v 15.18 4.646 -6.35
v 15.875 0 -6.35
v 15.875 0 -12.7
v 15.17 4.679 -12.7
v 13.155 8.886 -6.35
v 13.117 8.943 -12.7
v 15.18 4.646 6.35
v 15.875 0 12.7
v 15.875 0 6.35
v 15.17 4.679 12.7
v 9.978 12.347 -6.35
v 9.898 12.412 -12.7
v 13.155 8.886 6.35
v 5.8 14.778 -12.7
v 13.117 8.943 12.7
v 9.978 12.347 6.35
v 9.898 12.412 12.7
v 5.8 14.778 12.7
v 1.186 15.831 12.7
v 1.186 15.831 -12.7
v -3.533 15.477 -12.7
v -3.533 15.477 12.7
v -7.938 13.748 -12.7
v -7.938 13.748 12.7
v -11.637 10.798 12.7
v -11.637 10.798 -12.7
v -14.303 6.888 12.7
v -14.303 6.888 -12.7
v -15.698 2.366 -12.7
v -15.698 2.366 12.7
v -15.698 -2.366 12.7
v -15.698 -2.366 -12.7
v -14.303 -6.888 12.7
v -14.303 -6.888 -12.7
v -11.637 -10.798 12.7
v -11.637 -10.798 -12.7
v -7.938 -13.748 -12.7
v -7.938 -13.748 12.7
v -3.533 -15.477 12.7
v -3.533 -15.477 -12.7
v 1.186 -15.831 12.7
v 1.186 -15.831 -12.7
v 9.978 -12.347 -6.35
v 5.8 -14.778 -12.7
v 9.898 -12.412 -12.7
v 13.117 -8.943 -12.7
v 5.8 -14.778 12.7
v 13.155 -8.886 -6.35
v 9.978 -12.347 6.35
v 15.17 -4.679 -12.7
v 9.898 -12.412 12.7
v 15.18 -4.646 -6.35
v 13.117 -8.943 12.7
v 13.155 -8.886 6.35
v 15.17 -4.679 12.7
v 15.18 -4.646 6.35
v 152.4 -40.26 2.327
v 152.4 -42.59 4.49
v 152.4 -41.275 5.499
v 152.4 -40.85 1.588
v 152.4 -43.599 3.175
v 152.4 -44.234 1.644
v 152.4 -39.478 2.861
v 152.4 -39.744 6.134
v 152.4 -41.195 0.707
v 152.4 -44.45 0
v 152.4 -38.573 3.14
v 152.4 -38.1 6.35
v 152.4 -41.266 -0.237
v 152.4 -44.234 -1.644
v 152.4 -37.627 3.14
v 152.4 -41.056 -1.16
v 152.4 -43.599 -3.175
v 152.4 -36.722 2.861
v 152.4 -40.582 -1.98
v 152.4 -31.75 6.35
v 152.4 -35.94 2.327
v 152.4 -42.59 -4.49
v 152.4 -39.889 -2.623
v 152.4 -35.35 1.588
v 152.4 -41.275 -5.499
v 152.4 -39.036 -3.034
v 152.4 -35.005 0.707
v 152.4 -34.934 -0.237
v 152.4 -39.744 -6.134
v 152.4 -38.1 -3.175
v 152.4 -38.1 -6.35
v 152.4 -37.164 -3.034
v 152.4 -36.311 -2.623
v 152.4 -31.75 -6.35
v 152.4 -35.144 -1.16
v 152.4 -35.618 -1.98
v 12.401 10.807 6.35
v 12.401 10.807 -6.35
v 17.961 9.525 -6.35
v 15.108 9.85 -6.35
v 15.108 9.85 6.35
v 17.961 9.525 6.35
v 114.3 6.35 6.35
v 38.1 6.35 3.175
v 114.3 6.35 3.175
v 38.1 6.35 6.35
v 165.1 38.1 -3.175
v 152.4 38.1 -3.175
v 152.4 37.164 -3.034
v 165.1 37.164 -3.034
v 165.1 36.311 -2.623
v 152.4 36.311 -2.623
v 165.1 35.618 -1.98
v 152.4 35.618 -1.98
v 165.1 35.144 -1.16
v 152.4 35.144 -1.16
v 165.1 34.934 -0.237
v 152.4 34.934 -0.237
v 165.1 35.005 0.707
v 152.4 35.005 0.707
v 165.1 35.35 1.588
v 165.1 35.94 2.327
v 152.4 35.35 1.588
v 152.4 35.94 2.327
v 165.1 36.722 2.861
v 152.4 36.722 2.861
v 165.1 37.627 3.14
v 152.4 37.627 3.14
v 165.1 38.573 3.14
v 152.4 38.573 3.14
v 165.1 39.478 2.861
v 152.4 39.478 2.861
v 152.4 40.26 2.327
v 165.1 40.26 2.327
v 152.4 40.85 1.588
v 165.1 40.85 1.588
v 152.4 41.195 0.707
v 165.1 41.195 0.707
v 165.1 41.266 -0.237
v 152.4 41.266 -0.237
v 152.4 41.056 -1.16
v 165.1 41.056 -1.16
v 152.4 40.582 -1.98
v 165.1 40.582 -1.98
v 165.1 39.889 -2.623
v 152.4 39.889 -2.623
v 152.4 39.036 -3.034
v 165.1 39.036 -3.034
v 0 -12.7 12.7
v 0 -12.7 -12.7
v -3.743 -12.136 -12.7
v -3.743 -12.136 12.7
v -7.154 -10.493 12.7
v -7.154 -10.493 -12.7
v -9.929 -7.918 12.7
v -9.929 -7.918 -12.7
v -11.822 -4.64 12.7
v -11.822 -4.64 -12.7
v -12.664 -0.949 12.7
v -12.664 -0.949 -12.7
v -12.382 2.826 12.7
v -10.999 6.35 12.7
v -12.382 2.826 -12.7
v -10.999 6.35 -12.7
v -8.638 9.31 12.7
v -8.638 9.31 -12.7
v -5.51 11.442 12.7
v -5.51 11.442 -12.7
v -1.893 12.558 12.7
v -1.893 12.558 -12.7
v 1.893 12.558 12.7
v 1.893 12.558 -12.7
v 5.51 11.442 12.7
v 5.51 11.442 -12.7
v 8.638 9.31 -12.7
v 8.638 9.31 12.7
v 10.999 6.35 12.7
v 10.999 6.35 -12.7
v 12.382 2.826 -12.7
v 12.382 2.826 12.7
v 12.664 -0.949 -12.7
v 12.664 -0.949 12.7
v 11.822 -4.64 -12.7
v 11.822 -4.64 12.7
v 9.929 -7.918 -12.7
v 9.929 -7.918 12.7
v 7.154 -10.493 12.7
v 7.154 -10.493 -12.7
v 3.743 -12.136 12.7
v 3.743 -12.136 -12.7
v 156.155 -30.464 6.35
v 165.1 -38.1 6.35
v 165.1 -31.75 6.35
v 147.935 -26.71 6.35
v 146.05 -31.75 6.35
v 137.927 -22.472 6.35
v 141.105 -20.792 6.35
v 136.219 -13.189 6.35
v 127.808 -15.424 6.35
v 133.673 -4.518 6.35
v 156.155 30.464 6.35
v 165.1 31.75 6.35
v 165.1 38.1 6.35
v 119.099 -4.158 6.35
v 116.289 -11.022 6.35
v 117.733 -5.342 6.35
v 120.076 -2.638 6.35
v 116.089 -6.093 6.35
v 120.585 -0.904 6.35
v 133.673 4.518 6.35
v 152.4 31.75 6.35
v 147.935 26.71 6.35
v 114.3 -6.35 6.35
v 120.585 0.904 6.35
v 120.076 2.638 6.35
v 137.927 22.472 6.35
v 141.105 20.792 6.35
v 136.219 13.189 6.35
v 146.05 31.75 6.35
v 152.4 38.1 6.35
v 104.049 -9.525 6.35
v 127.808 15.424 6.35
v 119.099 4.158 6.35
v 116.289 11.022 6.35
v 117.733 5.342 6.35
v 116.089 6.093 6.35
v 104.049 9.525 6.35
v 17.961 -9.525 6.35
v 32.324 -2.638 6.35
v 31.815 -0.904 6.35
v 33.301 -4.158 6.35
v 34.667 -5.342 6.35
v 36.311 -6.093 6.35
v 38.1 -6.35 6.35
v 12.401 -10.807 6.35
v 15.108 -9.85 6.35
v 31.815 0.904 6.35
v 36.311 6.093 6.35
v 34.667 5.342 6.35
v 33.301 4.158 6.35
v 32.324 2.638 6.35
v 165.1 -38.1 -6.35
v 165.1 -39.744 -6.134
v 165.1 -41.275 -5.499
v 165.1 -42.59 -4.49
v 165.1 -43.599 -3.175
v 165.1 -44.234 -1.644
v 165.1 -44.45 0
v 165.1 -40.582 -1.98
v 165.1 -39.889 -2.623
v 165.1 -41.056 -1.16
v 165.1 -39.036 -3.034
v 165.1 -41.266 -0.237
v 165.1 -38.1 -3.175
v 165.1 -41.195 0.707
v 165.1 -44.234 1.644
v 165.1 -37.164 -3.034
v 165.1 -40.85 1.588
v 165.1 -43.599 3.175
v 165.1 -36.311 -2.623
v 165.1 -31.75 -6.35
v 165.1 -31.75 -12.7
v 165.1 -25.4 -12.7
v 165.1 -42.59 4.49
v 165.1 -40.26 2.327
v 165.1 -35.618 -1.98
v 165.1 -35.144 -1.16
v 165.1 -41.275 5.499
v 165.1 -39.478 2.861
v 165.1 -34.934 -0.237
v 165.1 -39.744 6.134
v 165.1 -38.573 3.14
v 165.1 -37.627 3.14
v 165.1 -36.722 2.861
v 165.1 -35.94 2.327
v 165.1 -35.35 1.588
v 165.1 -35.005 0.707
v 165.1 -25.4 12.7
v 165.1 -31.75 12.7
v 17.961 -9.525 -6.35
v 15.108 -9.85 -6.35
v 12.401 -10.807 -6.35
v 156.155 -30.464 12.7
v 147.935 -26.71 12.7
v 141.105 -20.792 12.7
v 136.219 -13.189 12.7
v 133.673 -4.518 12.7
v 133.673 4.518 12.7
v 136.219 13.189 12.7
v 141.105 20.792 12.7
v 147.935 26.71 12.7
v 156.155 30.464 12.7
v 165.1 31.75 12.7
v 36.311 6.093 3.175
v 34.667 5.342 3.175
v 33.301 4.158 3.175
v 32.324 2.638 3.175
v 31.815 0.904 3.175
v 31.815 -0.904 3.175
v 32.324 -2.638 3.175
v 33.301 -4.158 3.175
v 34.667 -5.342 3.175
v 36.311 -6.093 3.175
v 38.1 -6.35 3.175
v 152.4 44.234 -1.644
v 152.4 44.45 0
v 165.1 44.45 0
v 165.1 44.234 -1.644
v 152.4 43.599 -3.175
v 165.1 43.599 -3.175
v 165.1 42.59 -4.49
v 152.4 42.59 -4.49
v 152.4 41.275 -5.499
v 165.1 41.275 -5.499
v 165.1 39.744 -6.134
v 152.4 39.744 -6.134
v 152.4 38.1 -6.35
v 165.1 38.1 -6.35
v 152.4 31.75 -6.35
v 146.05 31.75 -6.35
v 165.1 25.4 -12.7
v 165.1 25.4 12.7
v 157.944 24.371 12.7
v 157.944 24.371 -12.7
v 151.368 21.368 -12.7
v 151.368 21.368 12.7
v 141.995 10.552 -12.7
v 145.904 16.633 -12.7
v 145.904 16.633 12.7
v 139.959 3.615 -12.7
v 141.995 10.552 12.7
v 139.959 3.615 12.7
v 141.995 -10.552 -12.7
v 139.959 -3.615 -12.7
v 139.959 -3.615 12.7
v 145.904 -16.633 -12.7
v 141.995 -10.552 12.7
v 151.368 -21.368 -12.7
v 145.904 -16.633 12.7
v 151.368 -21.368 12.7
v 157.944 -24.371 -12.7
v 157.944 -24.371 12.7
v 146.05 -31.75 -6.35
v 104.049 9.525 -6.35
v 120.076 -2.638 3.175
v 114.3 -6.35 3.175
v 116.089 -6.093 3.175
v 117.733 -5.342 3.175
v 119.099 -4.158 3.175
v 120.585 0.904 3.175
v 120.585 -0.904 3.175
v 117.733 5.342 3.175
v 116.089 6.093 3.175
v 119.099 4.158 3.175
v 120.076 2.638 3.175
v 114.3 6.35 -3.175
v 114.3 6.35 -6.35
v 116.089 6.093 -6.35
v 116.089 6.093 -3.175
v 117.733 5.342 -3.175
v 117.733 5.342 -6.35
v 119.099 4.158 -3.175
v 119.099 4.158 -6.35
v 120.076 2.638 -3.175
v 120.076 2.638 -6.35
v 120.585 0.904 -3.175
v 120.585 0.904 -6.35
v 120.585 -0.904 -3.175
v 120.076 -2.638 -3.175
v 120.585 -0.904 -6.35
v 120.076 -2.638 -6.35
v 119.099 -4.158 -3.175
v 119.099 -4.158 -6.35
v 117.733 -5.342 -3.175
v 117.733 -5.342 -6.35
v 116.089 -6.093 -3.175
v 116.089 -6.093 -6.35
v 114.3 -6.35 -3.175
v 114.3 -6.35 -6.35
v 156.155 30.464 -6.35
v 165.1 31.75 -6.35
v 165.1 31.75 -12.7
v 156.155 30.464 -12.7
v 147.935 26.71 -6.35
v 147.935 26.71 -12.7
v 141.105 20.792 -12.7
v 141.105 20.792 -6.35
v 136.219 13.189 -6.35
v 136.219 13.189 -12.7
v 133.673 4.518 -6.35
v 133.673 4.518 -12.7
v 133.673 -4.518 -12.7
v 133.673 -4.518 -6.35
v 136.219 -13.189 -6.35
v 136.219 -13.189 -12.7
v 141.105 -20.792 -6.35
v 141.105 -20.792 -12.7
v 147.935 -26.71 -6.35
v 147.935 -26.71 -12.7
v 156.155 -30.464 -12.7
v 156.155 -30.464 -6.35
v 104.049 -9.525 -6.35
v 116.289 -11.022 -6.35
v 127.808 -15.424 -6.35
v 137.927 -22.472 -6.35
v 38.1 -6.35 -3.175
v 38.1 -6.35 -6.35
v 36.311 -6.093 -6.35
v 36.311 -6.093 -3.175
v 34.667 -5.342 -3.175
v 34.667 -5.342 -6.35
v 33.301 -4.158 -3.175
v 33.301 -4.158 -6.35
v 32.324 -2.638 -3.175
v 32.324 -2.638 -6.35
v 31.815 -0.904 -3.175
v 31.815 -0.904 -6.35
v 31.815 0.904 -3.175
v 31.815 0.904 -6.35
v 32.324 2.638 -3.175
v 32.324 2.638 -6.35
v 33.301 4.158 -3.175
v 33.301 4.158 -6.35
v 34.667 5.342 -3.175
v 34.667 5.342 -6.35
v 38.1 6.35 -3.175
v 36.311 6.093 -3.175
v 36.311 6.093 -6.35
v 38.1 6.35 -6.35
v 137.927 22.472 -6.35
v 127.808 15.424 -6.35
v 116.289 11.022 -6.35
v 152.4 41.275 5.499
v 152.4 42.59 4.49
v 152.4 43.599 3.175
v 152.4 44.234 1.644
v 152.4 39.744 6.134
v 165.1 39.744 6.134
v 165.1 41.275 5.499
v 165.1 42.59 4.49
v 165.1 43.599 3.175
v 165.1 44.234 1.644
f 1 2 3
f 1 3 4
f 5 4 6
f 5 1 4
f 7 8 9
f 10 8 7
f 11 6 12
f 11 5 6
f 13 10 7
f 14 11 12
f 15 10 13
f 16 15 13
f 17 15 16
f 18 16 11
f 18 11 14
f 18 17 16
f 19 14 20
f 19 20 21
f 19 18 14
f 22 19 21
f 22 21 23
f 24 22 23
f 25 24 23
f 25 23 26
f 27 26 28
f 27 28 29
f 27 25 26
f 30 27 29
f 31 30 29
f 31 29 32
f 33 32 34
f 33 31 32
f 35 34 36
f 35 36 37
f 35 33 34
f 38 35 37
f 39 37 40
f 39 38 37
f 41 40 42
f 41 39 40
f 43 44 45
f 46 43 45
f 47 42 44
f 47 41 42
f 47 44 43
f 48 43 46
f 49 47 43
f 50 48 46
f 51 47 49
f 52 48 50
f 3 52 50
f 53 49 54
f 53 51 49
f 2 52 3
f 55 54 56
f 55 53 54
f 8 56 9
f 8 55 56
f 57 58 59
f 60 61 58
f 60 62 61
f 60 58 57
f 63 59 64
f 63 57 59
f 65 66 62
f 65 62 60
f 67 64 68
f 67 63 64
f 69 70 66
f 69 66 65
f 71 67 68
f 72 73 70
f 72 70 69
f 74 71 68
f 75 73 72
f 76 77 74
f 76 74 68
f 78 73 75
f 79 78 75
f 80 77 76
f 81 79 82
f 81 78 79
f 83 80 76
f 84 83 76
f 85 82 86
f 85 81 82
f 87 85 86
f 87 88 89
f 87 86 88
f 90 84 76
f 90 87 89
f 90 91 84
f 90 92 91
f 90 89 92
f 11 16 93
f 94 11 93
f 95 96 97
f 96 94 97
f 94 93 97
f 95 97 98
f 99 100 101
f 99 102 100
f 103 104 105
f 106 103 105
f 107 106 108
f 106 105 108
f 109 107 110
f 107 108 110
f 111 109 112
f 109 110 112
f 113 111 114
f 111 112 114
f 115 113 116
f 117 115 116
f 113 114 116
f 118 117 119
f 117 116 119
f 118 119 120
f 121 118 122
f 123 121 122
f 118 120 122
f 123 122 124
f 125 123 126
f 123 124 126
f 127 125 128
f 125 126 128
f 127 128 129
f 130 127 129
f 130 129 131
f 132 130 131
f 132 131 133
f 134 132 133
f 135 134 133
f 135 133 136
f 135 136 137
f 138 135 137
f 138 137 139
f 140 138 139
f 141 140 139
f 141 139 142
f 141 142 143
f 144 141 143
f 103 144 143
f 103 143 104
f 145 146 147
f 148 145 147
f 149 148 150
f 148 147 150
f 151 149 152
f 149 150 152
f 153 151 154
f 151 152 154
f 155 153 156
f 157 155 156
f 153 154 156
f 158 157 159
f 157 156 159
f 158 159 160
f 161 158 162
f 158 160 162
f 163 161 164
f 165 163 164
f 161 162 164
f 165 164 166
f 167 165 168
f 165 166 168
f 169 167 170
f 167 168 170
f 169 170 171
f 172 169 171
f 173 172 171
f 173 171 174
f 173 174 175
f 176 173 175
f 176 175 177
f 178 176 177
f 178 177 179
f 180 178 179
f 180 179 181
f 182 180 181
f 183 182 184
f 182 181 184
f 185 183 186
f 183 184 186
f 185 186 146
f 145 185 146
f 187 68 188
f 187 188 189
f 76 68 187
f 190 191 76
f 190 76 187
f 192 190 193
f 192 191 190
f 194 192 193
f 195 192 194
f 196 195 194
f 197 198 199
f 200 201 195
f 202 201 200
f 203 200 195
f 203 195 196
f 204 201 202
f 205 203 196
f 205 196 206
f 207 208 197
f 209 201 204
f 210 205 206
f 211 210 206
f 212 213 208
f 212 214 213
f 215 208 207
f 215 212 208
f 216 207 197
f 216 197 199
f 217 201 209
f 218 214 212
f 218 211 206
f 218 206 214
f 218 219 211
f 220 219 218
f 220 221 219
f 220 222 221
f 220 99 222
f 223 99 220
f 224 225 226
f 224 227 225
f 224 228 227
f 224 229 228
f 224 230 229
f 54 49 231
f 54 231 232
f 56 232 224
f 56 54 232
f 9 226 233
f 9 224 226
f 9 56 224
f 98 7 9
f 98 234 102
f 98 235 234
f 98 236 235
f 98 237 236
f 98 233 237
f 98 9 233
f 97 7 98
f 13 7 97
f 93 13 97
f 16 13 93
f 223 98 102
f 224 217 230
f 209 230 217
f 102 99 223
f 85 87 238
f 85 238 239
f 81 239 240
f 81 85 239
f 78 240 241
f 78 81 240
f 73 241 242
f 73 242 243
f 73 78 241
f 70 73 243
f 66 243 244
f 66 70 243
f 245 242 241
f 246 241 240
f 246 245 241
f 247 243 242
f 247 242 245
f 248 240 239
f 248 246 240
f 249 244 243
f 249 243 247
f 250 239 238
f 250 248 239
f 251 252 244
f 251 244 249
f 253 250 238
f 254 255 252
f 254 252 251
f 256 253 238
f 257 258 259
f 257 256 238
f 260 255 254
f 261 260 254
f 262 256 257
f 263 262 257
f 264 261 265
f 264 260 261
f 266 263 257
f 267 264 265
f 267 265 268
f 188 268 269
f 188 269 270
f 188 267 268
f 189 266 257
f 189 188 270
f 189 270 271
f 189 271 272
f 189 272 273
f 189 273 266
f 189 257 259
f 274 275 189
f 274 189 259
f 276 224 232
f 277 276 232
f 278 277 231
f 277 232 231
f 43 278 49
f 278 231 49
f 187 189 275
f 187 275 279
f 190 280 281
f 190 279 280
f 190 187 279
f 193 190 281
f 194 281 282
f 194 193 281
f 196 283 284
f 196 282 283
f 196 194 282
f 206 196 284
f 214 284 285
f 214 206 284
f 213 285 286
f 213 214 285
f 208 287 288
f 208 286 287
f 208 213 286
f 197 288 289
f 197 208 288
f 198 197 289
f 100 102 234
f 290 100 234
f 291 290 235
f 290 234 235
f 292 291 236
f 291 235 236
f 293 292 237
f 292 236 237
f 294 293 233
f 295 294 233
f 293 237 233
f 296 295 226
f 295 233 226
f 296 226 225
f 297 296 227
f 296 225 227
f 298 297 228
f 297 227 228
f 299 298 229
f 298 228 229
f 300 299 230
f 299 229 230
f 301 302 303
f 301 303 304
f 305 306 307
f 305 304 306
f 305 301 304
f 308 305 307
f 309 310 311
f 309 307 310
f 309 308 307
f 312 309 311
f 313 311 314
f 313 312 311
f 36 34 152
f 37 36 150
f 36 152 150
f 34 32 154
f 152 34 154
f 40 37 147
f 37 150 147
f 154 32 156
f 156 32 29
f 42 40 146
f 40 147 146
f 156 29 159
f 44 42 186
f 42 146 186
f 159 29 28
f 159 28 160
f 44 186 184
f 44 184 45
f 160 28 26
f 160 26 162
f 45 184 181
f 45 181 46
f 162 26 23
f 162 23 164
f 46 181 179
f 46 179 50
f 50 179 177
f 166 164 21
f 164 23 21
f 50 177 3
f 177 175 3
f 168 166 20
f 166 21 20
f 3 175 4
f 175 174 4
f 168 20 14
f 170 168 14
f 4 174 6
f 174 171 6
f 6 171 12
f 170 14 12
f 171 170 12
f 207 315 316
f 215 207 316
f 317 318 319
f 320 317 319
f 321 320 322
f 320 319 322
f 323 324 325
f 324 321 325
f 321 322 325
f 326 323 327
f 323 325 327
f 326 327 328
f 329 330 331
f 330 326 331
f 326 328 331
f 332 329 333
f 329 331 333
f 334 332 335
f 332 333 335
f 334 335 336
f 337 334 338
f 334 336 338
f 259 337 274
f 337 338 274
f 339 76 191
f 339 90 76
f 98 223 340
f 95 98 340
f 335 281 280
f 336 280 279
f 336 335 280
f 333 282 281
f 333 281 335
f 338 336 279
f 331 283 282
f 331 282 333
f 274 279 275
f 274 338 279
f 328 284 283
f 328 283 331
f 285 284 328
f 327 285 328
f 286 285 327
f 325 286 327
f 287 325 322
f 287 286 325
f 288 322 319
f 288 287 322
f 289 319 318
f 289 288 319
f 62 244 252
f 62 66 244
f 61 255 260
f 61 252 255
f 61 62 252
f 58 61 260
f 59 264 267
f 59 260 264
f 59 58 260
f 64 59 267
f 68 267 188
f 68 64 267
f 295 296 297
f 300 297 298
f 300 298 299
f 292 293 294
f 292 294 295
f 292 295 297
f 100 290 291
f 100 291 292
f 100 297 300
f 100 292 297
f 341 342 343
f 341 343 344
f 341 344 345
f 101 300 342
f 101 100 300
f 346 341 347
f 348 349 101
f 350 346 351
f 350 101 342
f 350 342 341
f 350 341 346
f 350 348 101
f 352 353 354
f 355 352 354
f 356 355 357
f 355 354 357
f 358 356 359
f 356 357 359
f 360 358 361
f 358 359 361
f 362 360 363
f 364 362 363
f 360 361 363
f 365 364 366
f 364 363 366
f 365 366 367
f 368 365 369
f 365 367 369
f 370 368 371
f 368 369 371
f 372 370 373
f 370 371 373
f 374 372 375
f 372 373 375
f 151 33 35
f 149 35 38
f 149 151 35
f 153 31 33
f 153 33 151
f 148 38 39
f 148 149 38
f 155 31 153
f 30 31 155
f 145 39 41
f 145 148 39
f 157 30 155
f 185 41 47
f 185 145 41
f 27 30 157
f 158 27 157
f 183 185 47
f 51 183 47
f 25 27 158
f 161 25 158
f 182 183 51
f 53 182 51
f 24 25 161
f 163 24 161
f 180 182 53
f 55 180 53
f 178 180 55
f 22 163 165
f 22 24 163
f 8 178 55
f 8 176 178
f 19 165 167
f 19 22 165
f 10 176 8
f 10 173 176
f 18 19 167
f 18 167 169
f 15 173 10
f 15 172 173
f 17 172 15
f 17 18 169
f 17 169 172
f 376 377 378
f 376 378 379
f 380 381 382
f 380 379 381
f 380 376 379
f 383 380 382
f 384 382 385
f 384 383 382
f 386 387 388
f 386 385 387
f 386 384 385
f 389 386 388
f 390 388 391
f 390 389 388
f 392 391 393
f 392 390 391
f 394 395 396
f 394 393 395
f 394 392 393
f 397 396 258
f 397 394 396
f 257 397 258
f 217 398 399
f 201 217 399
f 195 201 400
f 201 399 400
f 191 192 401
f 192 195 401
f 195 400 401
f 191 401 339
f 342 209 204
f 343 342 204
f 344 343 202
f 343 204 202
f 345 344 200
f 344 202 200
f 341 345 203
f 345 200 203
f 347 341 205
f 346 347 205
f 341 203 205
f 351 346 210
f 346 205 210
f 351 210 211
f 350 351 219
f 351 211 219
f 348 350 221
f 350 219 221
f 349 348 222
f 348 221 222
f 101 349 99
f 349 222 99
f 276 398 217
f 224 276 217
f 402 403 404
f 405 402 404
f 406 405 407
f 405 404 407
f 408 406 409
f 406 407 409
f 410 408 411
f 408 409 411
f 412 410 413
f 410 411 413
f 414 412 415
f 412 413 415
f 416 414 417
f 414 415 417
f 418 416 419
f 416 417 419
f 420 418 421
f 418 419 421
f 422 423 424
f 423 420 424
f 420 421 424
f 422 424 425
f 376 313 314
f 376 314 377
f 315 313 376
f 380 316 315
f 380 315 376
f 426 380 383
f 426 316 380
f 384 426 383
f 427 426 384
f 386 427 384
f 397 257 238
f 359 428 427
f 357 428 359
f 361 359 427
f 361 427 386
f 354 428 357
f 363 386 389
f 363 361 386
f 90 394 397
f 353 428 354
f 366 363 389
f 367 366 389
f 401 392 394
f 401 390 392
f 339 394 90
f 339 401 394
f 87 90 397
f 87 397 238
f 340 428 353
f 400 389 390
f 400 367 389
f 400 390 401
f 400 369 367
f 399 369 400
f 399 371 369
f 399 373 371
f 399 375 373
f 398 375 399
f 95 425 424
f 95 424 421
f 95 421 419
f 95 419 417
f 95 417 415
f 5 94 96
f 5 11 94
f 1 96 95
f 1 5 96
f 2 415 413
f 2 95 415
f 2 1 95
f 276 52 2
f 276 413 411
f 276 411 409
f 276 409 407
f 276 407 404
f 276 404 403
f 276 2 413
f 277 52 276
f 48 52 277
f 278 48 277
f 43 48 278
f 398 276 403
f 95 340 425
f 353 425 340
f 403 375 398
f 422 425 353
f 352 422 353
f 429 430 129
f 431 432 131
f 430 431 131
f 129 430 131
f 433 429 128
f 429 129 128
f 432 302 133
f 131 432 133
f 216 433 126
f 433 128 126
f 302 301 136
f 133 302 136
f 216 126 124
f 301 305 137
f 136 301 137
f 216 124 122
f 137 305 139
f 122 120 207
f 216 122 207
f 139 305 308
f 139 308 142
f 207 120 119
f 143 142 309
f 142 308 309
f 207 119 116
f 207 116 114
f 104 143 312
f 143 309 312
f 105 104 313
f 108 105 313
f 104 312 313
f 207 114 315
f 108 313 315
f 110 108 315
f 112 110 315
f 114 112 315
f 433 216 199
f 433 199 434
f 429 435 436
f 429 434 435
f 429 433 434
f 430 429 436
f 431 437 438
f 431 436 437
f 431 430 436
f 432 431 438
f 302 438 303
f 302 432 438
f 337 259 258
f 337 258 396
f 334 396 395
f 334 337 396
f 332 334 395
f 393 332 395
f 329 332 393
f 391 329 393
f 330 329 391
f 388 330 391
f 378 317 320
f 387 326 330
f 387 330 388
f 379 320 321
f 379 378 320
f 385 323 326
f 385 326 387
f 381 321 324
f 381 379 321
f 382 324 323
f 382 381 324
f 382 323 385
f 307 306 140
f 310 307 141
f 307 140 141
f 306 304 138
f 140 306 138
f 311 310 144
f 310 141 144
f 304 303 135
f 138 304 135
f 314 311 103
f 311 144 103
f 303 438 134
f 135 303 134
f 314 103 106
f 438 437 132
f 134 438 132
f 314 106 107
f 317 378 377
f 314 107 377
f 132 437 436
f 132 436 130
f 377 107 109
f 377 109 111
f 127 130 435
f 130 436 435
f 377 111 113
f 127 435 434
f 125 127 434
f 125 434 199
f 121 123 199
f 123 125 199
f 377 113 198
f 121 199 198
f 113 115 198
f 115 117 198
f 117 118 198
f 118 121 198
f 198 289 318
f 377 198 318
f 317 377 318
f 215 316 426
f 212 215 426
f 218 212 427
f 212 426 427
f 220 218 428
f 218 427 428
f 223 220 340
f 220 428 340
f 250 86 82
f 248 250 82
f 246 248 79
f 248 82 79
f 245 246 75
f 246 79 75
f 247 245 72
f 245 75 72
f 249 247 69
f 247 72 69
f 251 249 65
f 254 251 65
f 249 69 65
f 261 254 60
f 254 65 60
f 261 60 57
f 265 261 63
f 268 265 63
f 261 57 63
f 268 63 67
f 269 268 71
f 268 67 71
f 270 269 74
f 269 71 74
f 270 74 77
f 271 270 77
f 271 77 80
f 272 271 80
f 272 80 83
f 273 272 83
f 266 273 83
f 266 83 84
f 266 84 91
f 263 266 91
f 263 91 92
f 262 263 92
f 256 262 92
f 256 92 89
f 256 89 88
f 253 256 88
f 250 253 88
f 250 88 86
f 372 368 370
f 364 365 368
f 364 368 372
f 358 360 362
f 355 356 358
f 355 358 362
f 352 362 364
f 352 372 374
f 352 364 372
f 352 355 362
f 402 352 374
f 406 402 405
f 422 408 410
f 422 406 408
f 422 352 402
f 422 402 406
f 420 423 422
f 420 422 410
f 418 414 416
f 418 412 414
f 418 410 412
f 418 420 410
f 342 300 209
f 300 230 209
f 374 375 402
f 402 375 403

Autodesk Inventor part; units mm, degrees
ref_plane "YZ Plane" through (0, 0, 0) normal (1, 0, 0) x (0, 1, 0)
ref_plane "XZ Plane" through (0, 0, 0) normal (0, 1, 0) x (-1, 0, 0)
ref_plane "XY Plane" through (0, 0, 0) normal (0, 0, 1) x (1, 0, 0)
sketch "Sketch1" plane through (0, 0, 0) normal (0, 0, 1) x (1, 0, 0)
  circle A0 centre (0, 0) radius 15.875
  dimension "d0" = 31.75
extrude "Extrusion1" add sketch "Sketch1" along normal mid plane 25.4
sketch "Sketch2" plane through (0, 0, 0) normal (1, 0, 0) x (0, 1, 0)
  line L0 (0, 0) -> (9.525, 0)
  line L1 (9.525, 0) -> (9.525, -6.35)
  line L2 (9.525, -6.35) -> (-9.525, -6.35)
  line L3 (-9.525, -6.35) -> (-9.525, 6.35)
  line L4 (-9.525, 6.35) -> (9.525, 6.35)
  line L5 (9.525, 6.35) -> (9.525, 0)
  dimension "d3" = 9.525
  dimension "d4" = 6.35
  dimension "d5" = 19.05
  dimension "d6" = 12.7
extrude "Extrusion2" add sketch "Sketch2" along normal blind 114.3
fillet "Fillet1" radius 12.7 3 edges at (12.7, 9.525, -3.175) (12.7, -9.525, -3.175) (12.7, -9.525, 3.175)
sketch "Sketch3" plane through (0, 0, 0) normal (0, 0, 1) x (1, 0, 0)
  point P0 (0, 0)
sketch "Sketch4" plane through (0, 0, 12.7) normal (0, 0, 1) x (1, 0, 0)
  point P0 (0, 0)
  point P1 (0, 0)
hole "Hole1" at (0, 0, 12.7) direction (0, 0, -1) diameter 25.4 depth 25.4 tip angle 118
sketch "Sketch7" plane through (0, 0, 0) normal (0, 0, 1) x (1, 0, 0)
  line L0 (114.3, 9.525) -> (114.3, -9.525) projected
  arc A0 (165.1, 25.4) -> (165.1, -25.4) centre (165.1, 0) ccw
  line L1 (165.1, 25.4) -> (165.1, 44.45)
  line L2 (165.1, 44.45) -> (152.4, 44.45)
  line L3 (152.4, 44.45) -> (152.4, 31.75)
  line L4 (152.4, 31.75) -> (146.05, 31.75)
  arc A1 (104.0487, 9.525) -> (146.05, 31.75) centre (104.0487, 60.325) ccw
  line L5 (17.9605, 9.525) -> (114.3, 9.525) projected
  line L6 (165.1, -25.4) -> (165.1, -44.45)
  line L7 (165.1, -44.45) -> (152.4, -44.45)
  line L8 (152.4, -44.45) -> (152.4, -31.75)
  line L9 (152.4, -31.75) -> (146.05, -31.75)
  arc A2 (146.05, -31.75) -> (104.0487, -9.525) centre (104.0487, -60.325) ccw
  line L10 (0, -84.455) -> (0, 84.455) projected
  line L11 (-52.07, 0) -> (201.295, 0) projected
  line L12 (17.9605, -9.525) -> (114.3, -9.525) projected
  point P0 (0, 0)
  point P1 (139.7, 0)
  dimension "d40" = 19.05
  dimension "d41" = 12.7
  dimension "d42" = 12.7
  dimension "d43" = 6.35
  dimension "d45" = 25.4
  dimension "d46" = 50.8
  dimension "d47" = 19.05
  dimension "d48" = 88.9
  dimension "d49" = 165.1
extrude "Extrusion3" add sketch "Sketch7" along normal mid plane 12.7
sketch "Sketch11" plane through (0, 0, 6.35) normal (0, 0, 1) x (1, 0, 0)
  arc A0 (165.1, 31.75) -> (165.1, -31.75) centre (165.1, 0) ccw
  arc A1 (165.1, 25.4) -> (165.1, -25.4) centre (165.1, 0) ccw projected
  arc A2 (165.1, 25.4) -> (165.1, -25.4) centre (165.1, 0) ccw
  line L0 (165.1, 25.4) -> (165.1, 44.45) projected
  line L1 (165.1, 31.75) -> (165.1, 25.4)
  line L2 (165.1, -44.45) -> (165.1, -25.4) projected
  line L3 (165.1, -25.4) -> (165.1, -31.75)
  point P0 (0, 0)
  dimension "d56" = 25.4
  dimension "d57" = 31.75
extrude "Extrusion5" add sketch "Sketch11" along normal blind 6.35
sketch "Sketch12" plane through (0, 0, -6.35) normal (0, 0, -1) x (-1, 0, 0)
  arc A0 (-165.1, -25.4) -> (-165.1, 25.4) centre (-165.1, 0) ccw projected
  arc A1 (-165.1, -25.4) -> (-165.1, 25.4) centre (-165.1, 0) ccw
  arc A2 (-165.1, -31.75) -> (-165.1, 31.75) centre (-165.1, 0) ccw
  line L0 (-165.1, 44.45) -> (-165.1, 25.4) projected
  line L1 (-165.1, 31.75) -> (-165.1, 25.4)
  line L2 (-165.1, -31.75) -> (-165.1, -25.4) projected
  line L3 (-165.1, -25.4) -> (-165.1, -31.75)
  point P0 (0, 0)
extrude "Extrusion6" add sketch "Sketch12" along normal blind 6.35
sketch "Sketch13" plane through (165.1, 44.45, 6.35) normal (1, 0, 0) x (0, 0, -1)
  point P0 (6.35, -44.45)
  point P1 (6.35, -6.35)
  point P2 (6.35, -82.55)
hole "Hole2" at (165.1, 38.1, 0) at (165.1, -38.1, 0) direction (-1, 0, 0) diameter 6.35 depth 12.7 tip angle 118
fillet "Fillet2" radius 6.35 4 edges at (158.75, 44.45, 6.35) (158.75, 44.45, -6.35) (158.75, -44.45, 6.35) (158.75, -44.45, -6.35)
sketch "Sketch14" plane through (0, 0, 6.35) normal (0, 0, 1) x (1, 0, 0)
  line L0 (17.9605, -9.525) -> (104.0487, -9.525) projected
  line L1 (0, -62.23) -> (0, 62.23) projected
  arc A0 (38.1, 6.35) -> (38.1, -6.35) centre (38.1, 0) ccw
  line L2 (38.1, 6.35) -> (114.3, 6.35)
  line L3 (38.1, -6.35) -> (114.3, -6.35)
  arc A1 (114.3, -6.35) -> (114.3, 6.35) centre (114.3, 0) ccw
  point P0 (0, 0)
  dimension "d73" = 12.7
  dimension "d74" = 76.2
  dimension "d75" = 76.2
  dimension "d76" = 12.7
  dimension "d77" = 38.1
extrude "Extrusion7" cut sketch "Sketch14" against normal blind 3.175
sketch "Sketch15" plane through (0, 0, -6.35) normal (0, 0, -1) x (-1, 0, 0)
  line L0 (0, 0) -> (-38.1, 0)
  arc A0 (-38.1, -6.35) -> (-38.1, 6.35) centre (-38.1, 0) ccw
  line L1 (-38.1, 6.35) -> (-114.3, 6.35)
  line L2 (-38.1, 6.35) -> (-114.3, 6.35)
  line L3 (-114.3, -6.35) -> (-38.1, -6.35) projected
  line L4 (-38.1, -6.35) -> (-114.3, -6.35)
  arc A1 (-114.3, 6.35) -> (-114.3, -6.35) centre (-114.3, 0) ccw
  dimension "d80" = 38.1
  dimension "d82" = 76.2
extrude "Extrusion8" cut sketch "Sketch15" against normal blind 3.175
properties part number "Ch4 Part 3"
